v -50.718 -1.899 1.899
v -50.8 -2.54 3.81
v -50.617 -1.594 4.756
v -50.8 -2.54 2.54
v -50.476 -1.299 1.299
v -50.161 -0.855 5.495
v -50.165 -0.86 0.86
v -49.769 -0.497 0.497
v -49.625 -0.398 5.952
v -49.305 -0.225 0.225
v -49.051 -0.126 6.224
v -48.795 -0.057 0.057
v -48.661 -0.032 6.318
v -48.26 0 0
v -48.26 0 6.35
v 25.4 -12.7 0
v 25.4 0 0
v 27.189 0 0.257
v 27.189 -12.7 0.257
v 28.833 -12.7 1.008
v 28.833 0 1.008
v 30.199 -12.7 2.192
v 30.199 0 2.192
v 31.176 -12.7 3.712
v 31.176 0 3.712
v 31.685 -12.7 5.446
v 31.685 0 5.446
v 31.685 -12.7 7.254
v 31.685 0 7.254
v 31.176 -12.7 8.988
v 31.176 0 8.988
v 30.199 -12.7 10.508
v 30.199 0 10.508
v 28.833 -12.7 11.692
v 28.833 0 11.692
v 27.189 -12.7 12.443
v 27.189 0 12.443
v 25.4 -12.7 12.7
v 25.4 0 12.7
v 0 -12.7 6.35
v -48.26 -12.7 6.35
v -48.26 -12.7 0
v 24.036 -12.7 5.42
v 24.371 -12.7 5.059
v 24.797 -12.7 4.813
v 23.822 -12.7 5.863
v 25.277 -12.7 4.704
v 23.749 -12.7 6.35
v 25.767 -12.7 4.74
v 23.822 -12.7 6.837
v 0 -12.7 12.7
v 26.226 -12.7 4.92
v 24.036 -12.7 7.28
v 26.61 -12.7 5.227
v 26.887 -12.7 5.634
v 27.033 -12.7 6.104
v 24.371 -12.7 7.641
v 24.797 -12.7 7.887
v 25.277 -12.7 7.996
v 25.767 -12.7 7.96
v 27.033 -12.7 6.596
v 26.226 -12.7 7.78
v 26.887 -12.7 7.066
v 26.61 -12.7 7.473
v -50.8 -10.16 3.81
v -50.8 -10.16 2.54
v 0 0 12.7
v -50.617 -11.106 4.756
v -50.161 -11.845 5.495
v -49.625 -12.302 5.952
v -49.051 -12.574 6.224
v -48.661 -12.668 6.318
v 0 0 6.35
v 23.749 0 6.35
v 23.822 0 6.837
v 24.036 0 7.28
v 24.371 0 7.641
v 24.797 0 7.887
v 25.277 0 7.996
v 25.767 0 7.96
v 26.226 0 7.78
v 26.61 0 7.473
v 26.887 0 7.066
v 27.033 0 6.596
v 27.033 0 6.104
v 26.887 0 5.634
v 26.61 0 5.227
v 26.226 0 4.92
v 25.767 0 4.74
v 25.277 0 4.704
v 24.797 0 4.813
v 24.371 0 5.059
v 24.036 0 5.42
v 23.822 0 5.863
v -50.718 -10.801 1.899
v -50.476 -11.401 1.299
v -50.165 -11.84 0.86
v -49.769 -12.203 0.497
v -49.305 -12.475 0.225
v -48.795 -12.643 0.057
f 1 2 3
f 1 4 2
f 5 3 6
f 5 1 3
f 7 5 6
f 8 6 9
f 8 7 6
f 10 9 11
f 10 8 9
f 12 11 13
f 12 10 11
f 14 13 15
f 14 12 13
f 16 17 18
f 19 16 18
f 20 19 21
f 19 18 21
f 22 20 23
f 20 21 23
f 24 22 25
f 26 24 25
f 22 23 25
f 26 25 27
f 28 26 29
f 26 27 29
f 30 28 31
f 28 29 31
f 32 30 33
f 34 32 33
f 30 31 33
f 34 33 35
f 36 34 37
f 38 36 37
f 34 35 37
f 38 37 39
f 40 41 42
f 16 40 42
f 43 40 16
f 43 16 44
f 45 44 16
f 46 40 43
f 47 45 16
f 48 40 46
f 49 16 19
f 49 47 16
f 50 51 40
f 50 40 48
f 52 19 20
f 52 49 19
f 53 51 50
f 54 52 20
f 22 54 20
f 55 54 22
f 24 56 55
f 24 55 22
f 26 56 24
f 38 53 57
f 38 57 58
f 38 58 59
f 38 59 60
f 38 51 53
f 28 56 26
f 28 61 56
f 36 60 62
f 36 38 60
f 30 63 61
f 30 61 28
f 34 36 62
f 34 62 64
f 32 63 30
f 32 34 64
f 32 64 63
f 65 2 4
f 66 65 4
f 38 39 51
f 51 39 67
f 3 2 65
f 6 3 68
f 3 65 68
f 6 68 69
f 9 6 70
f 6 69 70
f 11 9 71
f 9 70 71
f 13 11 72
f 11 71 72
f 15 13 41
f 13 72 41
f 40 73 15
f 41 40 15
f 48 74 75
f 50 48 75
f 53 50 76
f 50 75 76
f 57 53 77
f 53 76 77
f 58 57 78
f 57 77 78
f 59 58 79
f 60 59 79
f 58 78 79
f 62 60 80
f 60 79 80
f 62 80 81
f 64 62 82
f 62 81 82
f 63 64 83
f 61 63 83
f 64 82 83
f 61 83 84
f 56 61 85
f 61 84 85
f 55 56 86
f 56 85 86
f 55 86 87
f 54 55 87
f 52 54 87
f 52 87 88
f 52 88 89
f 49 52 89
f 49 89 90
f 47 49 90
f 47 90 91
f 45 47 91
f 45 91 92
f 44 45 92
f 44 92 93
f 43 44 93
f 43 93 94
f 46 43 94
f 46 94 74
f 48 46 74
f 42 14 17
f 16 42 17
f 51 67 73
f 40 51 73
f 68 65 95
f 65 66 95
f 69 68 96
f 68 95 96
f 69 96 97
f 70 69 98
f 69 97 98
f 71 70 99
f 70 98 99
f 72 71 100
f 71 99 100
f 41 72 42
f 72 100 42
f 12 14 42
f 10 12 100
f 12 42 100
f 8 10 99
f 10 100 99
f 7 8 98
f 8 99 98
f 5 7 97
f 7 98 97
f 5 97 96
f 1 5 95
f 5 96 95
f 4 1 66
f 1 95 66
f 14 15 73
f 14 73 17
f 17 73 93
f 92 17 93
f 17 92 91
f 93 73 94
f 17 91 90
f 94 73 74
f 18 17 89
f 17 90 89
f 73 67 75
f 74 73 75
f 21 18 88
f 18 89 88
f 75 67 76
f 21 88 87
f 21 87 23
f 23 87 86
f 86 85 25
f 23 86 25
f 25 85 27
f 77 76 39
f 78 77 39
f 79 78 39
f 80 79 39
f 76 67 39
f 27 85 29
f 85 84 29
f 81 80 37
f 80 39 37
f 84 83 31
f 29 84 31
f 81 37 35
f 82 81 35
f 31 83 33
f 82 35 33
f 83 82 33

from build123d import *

# Parameters (mm, degrees)
F1_DEPTH       = 12.7
F3_D           = 3.302
F3_CBORE_D     = 6.5024
F3_CBORE_DEPTH = 0
F4_R           = 2.54


with BuildPart() as f1:
    # F0 (on Front) → F1 (new body)
    with BuildSketch(Plane.XZ):
        with BuildLine():
            Line((-50.8, 0), (0, 0))
            Line((0, 0), (25.4, 0))
            ThreePointArc((25.4, 0), (31.75, 6.35), (25.4, 12.7))
            Line((25.4, 12.7), (0, 12.7))
            Line((0, 12.7), (0, 6.35))
            Line((0, 6.35), (-50.8, 6.35))
            Line((-50.8, 6.35), (-50.8, 0))
        make_face()
    extrude(amount=F1_DEPTH)

    # F3 (through all)
    with Locations(Plane.XZ.offset(12.7)):
        with Locations((25.4, 6.35)):
            CounterBoreHole(F3_D / 2, F3_CBORE_D / 2, F3_CBORE_DEPTH)

    # F4
    f4_edges = [f1.edges().sort_by_distance(p)[0] for p in [
        (-50.8, -6.35, 6.35),
        (-50.8, -6.35, 0),
        (-50.8, 0, 3.175),
        (-50.8, -12.7, 3.175),
    ]]
    fillet(f4_edges, radius=F4_R)


solid = f1.part
